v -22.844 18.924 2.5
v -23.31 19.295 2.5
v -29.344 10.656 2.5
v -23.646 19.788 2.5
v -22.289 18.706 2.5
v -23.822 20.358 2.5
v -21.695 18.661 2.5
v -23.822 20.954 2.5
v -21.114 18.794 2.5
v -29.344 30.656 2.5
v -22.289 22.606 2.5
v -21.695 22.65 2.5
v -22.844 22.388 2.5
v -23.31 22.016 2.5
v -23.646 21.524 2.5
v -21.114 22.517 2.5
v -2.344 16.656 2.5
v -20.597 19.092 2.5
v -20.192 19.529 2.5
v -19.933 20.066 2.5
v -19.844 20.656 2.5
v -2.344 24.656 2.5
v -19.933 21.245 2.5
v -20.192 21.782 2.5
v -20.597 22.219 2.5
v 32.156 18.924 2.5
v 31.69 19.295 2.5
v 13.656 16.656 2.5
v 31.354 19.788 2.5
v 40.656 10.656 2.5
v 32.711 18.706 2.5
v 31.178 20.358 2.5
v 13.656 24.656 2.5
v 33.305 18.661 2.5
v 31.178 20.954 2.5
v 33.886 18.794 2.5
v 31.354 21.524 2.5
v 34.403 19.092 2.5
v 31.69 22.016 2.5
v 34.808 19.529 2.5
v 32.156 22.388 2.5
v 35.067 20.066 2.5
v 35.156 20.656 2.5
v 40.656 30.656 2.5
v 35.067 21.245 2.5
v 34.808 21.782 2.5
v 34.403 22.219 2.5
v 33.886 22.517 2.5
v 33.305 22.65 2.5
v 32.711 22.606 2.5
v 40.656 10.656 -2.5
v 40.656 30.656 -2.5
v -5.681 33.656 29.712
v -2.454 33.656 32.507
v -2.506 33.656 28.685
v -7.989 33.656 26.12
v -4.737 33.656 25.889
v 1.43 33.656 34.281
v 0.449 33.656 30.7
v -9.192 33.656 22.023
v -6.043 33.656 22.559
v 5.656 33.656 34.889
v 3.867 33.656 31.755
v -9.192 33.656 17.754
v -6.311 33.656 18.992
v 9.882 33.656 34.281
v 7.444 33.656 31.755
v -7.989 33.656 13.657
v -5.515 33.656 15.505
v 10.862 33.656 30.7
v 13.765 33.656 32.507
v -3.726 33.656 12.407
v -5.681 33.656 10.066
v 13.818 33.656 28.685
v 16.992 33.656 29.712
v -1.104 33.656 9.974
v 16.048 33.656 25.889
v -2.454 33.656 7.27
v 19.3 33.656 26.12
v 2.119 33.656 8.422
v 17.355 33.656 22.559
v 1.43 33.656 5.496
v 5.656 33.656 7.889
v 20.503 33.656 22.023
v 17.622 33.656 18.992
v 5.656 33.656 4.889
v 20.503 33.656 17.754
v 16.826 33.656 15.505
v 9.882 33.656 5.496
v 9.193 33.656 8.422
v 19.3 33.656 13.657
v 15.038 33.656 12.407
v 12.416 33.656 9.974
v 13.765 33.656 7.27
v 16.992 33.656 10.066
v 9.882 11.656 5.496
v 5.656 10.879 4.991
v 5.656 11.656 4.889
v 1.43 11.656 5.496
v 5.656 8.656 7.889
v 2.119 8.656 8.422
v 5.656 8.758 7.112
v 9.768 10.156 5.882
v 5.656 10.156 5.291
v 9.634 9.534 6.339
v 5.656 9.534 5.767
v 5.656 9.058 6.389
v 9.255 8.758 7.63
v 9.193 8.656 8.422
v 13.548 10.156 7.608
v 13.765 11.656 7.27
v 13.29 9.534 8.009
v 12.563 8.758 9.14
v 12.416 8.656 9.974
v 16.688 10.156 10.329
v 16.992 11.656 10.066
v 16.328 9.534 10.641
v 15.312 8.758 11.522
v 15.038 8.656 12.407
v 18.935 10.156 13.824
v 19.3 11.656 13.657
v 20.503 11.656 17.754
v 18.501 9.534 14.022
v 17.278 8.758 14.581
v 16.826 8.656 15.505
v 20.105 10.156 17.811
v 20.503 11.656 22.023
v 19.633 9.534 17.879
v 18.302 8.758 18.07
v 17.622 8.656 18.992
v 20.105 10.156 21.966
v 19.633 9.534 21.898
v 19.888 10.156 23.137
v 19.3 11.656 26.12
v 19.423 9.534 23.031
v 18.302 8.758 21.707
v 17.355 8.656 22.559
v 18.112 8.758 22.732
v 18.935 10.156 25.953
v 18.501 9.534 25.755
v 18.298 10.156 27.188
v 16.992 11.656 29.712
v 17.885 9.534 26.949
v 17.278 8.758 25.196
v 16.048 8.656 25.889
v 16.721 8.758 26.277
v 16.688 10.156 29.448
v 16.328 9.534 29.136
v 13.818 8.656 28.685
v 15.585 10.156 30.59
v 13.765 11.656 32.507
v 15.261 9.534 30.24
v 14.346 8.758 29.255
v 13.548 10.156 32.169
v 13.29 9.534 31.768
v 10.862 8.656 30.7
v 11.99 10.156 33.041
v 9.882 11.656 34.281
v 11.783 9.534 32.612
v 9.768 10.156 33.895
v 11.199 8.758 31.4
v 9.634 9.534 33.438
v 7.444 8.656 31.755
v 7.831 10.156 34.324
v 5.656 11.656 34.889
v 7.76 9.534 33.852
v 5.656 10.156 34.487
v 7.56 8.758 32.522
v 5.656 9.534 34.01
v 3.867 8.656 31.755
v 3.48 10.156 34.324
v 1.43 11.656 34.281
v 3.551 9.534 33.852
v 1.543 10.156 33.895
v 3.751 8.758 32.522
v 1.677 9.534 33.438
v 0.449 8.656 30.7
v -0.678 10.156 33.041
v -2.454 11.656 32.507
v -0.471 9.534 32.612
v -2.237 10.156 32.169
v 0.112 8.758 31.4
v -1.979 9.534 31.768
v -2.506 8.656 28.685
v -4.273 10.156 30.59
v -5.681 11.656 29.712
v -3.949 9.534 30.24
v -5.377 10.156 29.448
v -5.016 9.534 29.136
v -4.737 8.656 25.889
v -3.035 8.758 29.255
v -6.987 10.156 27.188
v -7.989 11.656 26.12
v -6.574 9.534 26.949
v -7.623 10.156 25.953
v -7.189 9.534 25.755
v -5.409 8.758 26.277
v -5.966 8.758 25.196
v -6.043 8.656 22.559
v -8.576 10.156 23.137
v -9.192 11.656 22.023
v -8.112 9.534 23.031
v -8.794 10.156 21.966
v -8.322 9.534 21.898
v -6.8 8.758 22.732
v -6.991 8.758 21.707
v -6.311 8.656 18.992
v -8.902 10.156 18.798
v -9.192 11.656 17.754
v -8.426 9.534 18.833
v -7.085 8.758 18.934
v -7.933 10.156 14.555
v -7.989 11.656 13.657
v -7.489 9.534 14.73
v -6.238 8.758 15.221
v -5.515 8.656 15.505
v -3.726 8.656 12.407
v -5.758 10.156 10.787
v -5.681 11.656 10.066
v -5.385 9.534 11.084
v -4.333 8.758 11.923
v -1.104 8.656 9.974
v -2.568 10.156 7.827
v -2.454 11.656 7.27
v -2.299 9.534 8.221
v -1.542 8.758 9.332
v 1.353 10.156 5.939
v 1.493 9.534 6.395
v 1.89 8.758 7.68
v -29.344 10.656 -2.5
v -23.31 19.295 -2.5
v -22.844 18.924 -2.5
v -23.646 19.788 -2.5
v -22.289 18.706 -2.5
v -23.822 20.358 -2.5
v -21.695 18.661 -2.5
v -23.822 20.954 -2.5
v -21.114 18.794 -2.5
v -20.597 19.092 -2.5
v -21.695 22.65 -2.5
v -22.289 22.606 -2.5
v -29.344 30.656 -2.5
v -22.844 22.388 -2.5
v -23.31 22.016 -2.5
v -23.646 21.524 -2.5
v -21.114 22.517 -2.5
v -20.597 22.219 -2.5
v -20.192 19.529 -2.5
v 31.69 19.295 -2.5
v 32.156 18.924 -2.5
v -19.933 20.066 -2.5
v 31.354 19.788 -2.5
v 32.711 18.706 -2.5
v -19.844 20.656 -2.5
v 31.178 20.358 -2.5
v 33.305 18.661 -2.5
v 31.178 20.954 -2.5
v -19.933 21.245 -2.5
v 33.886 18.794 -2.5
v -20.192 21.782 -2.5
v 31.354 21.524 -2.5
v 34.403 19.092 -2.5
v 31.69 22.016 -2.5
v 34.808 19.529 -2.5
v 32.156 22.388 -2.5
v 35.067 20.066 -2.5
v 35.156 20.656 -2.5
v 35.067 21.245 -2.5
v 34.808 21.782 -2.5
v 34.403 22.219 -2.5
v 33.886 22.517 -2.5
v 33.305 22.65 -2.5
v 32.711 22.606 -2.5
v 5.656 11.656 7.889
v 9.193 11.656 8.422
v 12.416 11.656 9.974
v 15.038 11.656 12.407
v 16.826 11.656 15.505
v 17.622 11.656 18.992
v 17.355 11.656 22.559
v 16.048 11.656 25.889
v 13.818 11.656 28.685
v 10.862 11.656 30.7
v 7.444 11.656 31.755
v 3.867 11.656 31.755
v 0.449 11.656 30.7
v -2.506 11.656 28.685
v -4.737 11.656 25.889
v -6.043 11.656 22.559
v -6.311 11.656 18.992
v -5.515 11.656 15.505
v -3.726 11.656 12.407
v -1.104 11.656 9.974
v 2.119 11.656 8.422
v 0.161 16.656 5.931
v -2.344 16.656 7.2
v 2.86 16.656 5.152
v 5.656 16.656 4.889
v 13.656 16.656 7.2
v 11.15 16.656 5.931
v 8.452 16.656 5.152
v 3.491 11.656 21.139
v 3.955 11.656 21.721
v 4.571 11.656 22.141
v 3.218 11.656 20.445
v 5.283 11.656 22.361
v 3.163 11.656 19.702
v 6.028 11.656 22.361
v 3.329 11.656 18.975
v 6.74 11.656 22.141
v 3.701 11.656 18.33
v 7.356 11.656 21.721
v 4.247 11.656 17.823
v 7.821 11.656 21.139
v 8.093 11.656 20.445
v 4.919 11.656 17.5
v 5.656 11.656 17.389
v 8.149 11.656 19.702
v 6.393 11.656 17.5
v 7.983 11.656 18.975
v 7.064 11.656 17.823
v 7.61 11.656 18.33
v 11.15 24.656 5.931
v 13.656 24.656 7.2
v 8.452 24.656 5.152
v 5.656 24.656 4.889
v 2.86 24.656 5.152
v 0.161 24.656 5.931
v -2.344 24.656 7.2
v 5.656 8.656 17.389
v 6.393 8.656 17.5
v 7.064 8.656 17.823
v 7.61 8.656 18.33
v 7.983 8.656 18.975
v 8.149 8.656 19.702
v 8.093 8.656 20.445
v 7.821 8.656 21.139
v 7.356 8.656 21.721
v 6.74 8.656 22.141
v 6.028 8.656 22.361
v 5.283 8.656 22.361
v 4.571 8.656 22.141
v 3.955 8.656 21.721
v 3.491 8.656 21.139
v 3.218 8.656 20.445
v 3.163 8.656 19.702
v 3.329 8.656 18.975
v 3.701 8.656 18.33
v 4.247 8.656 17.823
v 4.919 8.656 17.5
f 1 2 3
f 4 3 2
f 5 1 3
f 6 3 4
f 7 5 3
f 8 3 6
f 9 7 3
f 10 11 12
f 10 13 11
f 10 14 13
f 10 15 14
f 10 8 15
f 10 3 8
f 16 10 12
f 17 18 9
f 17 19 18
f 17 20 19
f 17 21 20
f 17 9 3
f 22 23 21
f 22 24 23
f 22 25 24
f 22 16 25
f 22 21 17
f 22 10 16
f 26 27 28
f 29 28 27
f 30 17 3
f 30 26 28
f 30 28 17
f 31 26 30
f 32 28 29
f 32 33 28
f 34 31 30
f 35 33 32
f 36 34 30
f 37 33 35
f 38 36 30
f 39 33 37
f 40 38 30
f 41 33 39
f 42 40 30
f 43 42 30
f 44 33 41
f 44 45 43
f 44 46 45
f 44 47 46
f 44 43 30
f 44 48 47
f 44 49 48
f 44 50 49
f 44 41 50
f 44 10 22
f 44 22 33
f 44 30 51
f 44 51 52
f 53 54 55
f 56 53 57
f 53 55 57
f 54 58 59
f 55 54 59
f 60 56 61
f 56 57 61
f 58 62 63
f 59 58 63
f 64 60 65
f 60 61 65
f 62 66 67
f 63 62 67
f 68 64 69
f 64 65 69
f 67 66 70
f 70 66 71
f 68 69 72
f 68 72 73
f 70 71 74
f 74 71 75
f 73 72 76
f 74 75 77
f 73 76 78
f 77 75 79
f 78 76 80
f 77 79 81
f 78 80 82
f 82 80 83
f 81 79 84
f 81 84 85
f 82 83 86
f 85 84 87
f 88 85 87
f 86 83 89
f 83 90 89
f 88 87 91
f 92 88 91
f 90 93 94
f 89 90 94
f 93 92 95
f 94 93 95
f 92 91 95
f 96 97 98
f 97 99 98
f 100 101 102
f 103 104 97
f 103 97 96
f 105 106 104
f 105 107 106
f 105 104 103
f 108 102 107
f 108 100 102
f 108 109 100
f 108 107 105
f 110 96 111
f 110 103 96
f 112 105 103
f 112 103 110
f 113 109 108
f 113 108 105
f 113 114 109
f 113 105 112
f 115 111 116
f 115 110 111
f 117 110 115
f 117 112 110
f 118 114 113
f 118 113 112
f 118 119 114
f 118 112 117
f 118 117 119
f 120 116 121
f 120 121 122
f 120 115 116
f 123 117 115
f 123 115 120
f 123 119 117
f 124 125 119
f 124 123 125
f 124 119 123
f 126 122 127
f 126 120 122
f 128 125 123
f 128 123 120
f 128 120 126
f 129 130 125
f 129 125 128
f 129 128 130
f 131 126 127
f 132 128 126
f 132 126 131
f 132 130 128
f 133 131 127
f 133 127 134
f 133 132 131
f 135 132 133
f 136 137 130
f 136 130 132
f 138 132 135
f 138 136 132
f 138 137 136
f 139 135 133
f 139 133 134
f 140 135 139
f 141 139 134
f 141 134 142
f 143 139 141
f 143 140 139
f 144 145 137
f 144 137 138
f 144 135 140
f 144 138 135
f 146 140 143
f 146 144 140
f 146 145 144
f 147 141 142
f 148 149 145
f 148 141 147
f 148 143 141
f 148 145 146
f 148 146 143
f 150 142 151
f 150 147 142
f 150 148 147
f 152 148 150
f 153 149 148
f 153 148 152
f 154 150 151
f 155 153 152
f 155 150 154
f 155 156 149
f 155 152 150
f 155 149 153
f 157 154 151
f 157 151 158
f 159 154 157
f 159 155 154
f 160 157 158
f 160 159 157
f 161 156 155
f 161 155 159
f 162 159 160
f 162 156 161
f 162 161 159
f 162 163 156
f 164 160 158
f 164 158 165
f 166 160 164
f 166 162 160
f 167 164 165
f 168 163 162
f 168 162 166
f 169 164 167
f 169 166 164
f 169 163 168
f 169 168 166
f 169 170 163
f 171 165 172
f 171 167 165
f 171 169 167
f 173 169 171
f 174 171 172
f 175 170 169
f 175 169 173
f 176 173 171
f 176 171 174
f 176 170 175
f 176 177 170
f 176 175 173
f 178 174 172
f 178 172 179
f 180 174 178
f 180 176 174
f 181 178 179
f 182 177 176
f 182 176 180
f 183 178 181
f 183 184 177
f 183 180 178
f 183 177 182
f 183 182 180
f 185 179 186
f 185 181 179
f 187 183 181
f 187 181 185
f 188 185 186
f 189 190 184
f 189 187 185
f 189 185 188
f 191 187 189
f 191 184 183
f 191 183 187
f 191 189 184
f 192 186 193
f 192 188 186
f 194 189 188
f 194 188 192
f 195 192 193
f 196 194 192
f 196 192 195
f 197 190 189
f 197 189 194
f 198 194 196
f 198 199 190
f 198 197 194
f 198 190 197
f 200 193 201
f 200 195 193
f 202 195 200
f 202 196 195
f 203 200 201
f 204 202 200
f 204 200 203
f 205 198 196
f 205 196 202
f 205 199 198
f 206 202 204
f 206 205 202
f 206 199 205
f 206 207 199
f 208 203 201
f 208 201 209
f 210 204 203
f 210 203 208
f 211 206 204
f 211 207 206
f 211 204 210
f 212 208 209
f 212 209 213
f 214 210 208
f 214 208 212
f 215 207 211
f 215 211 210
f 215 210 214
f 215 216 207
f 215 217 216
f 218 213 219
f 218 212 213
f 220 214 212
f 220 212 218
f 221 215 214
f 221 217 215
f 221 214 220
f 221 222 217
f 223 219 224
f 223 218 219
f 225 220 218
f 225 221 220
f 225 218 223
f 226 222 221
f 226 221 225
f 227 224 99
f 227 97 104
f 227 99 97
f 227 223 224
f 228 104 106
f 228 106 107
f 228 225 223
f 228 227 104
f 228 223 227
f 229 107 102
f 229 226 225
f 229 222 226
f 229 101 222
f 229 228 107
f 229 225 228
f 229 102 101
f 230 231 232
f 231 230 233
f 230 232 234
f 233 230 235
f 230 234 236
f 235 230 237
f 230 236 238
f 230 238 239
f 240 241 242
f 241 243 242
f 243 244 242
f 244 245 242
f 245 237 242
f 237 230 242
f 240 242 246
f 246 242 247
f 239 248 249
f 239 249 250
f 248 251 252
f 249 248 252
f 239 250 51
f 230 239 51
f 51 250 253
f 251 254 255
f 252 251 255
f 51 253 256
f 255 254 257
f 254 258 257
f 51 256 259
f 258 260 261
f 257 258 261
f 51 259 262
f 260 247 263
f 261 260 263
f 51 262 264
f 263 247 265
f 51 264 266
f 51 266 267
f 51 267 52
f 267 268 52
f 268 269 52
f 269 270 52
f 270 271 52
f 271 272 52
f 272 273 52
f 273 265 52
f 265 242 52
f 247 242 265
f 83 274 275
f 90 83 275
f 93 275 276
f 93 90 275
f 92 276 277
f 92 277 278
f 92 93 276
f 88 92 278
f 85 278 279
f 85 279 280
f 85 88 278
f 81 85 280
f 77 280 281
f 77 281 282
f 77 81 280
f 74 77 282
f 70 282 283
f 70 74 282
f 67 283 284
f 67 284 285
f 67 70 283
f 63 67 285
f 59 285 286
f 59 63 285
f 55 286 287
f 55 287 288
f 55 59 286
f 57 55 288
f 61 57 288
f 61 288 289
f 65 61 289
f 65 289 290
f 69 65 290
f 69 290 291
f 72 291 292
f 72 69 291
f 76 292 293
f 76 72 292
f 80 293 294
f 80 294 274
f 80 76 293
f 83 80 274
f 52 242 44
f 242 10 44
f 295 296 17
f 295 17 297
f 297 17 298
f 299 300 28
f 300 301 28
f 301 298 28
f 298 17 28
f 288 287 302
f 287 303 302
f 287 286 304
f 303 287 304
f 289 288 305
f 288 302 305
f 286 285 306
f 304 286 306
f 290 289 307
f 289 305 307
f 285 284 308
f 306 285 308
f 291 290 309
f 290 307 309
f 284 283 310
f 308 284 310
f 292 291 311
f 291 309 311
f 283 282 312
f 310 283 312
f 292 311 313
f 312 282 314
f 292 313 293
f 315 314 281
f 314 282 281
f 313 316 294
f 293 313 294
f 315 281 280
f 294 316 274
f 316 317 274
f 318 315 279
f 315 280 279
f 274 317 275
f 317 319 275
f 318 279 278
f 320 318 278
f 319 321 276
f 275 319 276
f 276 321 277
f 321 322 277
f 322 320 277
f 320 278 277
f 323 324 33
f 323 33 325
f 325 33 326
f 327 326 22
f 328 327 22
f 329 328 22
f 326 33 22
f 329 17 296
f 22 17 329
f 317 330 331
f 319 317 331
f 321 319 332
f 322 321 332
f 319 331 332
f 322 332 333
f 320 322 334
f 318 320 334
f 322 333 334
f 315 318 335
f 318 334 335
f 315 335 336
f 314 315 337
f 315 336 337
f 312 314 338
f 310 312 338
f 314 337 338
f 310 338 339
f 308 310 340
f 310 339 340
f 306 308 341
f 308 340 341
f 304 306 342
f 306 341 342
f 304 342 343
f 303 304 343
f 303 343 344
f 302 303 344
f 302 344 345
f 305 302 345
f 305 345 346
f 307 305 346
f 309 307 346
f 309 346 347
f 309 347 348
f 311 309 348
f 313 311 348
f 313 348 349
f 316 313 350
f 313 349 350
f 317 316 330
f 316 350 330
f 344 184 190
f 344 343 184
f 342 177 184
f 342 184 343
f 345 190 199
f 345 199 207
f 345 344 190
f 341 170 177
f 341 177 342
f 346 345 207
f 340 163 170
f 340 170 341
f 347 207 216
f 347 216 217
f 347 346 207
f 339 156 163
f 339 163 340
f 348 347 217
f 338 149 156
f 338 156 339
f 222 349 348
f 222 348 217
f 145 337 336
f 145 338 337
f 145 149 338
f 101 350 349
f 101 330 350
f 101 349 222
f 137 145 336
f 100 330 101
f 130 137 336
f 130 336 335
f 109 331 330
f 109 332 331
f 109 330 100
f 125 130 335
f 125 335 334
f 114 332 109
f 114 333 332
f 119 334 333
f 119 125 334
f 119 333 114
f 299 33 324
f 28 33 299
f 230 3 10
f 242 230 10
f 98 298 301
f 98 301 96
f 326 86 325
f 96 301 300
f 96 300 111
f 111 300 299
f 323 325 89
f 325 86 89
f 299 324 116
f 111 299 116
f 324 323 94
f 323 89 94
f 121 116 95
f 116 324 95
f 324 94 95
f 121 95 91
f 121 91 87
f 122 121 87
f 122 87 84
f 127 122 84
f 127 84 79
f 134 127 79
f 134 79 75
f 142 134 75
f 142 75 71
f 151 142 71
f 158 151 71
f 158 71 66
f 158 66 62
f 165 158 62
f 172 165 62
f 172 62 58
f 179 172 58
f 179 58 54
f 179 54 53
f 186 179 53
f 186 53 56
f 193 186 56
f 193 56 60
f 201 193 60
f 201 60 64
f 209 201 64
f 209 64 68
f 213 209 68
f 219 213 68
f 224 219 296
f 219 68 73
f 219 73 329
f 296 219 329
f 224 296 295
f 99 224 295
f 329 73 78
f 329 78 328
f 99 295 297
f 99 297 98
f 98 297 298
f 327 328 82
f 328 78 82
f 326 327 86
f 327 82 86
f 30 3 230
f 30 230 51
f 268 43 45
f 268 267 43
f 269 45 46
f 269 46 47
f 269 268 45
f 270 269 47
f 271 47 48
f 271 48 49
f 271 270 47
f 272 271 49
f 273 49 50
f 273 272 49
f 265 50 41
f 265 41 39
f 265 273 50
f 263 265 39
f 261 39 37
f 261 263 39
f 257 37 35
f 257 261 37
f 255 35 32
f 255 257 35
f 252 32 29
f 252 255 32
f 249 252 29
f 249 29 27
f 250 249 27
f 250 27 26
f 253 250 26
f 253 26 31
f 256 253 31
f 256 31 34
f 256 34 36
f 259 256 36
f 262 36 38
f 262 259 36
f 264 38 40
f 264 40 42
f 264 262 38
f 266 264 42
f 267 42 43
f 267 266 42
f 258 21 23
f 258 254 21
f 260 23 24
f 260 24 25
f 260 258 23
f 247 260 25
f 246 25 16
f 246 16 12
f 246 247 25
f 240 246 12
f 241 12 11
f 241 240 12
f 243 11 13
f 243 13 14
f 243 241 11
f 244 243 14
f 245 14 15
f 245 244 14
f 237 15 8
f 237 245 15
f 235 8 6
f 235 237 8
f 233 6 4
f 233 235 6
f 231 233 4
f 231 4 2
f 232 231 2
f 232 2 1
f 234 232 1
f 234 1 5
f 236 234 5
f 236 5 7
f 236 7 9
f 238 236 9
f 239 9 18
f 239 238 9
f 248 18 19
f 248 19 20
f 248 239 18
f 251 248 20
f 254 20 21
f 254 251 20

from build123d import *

# Parameters (mm, degrees)
SKETCH1_W                = 70
SKETCH1_H                = 20
SKETCH1_R                = 2
BOSS_EXTRUDE1_DEPTH      = 2.5
BOSS_EXTRUDE2_DEPTH      = 5
BOSS_EXTRUDE3_DEPTH      = 5
BOSS_EXTRUDE3_DEPTH_BACK = 17
SKETCH6_R                = 15
SKETCH6_R_2              = 12
SKETCH10_R               = 15
BOSS_EXTRUDE4_DEPTH      = 3
SKETCH11_R               = 2.5
CUT_EXTRUDE1_DEPTH       = 3
FILLET1_R                = 3


with BuildPart() as part:
    # Sketch1 → Boss-Extrude1 (new, symmetric)
    with BuildSketch(Plane.XY):
        with Locations((5.655737705, 20.655737705)):
            Rectangle(SKETCH1_W, SKETCH1_H)
        with Locations((-21.844262295, 20.655737705)):
            Circle(SKETCH1_R, mode=Mode.SUBTRACT)
        with Locations((33.155737705, 20.655737705)):
            Circle(SKETCH1_R, mode=Mode.SUBTRACT)
    extrude(amount=BOSS_EXTRUDE1_DEPTH, both=True)

    # Sketch4 → Boss-Extrude2 (add)
    with BuildSketch(Plane.XY.offset(2.5)):
        Polygon((5.655737705, 24.655737705), (13.655737705, 24.655737705), (13.655737705, 16.655737705), (5.655737705, 16.655737705), (-2.344262295, 16.655737705), (-2.344262295, 24.655737705), align=None)
    extrude(amount=BOSS_EXTRUDE2_DEPTH)

    # Sketch6 → Boss-Extrude3 (add, two sides: drawn at the far end of the back side and taken through both)
    with BuildSketch(Plane(origin=(0, 16.655737705, 0), x_dir=(-1, 0, 0), z_dir=(0, -1, 0)).offset(-BOSS_EXTRUDE3_DEPTH_BACK)):
        with Locations(Location((-5.655737705, -19.888643818, 0), (0, 0, 90))):
            Circle(SKETCH6_R)
        with Locations(Location((-5.655737705, -19.888643818, 0), (0, 0, 90))):
            Circle(SKETCH6_R_2, mode=Mode.SUBTRACT)
    extrude(amount=BOSS_EXTRUDE3_DEPTH + BOSS_EXTRUDE3_DEPTH_BACK)

    # Sketch10 → Boss-Extrude4 (add)
    with BuildSketch(Plane.XZ.offset(-11.655737705)):
        with Locations(Location((5.655737705, 19.888643818, 0), (0, 0, 270))):
            Circle(SKETCH10_R)
    extrude(amount=BOSS_EXTRUDE4_DEPTH)

    # Sketch11 → Cut-Extrude1 (cut)
    with BuildSketch(Plane.XZ.offset(-8.655737705)):
        with Locations(Location((5.655737705, 19.888643818, 0), (0, 0, 270))):
            Circle(SKETCH11_R)
    extrude(amount=-CUT_EXTRUDE1_DEPTH, mode=Mode.SUBTRACT)

    # Fillet1
    fillet1_edges = [part.edges().sort_by_distance(p)[0] for p in [
        (5.655737705, 8.655737705, 34.888643818),
    ]]
    fillet(fillet1_edges, radius=FILLET1_R - 0.0001)  # a hair under: the kernel refuses the full size


solid = part.part
